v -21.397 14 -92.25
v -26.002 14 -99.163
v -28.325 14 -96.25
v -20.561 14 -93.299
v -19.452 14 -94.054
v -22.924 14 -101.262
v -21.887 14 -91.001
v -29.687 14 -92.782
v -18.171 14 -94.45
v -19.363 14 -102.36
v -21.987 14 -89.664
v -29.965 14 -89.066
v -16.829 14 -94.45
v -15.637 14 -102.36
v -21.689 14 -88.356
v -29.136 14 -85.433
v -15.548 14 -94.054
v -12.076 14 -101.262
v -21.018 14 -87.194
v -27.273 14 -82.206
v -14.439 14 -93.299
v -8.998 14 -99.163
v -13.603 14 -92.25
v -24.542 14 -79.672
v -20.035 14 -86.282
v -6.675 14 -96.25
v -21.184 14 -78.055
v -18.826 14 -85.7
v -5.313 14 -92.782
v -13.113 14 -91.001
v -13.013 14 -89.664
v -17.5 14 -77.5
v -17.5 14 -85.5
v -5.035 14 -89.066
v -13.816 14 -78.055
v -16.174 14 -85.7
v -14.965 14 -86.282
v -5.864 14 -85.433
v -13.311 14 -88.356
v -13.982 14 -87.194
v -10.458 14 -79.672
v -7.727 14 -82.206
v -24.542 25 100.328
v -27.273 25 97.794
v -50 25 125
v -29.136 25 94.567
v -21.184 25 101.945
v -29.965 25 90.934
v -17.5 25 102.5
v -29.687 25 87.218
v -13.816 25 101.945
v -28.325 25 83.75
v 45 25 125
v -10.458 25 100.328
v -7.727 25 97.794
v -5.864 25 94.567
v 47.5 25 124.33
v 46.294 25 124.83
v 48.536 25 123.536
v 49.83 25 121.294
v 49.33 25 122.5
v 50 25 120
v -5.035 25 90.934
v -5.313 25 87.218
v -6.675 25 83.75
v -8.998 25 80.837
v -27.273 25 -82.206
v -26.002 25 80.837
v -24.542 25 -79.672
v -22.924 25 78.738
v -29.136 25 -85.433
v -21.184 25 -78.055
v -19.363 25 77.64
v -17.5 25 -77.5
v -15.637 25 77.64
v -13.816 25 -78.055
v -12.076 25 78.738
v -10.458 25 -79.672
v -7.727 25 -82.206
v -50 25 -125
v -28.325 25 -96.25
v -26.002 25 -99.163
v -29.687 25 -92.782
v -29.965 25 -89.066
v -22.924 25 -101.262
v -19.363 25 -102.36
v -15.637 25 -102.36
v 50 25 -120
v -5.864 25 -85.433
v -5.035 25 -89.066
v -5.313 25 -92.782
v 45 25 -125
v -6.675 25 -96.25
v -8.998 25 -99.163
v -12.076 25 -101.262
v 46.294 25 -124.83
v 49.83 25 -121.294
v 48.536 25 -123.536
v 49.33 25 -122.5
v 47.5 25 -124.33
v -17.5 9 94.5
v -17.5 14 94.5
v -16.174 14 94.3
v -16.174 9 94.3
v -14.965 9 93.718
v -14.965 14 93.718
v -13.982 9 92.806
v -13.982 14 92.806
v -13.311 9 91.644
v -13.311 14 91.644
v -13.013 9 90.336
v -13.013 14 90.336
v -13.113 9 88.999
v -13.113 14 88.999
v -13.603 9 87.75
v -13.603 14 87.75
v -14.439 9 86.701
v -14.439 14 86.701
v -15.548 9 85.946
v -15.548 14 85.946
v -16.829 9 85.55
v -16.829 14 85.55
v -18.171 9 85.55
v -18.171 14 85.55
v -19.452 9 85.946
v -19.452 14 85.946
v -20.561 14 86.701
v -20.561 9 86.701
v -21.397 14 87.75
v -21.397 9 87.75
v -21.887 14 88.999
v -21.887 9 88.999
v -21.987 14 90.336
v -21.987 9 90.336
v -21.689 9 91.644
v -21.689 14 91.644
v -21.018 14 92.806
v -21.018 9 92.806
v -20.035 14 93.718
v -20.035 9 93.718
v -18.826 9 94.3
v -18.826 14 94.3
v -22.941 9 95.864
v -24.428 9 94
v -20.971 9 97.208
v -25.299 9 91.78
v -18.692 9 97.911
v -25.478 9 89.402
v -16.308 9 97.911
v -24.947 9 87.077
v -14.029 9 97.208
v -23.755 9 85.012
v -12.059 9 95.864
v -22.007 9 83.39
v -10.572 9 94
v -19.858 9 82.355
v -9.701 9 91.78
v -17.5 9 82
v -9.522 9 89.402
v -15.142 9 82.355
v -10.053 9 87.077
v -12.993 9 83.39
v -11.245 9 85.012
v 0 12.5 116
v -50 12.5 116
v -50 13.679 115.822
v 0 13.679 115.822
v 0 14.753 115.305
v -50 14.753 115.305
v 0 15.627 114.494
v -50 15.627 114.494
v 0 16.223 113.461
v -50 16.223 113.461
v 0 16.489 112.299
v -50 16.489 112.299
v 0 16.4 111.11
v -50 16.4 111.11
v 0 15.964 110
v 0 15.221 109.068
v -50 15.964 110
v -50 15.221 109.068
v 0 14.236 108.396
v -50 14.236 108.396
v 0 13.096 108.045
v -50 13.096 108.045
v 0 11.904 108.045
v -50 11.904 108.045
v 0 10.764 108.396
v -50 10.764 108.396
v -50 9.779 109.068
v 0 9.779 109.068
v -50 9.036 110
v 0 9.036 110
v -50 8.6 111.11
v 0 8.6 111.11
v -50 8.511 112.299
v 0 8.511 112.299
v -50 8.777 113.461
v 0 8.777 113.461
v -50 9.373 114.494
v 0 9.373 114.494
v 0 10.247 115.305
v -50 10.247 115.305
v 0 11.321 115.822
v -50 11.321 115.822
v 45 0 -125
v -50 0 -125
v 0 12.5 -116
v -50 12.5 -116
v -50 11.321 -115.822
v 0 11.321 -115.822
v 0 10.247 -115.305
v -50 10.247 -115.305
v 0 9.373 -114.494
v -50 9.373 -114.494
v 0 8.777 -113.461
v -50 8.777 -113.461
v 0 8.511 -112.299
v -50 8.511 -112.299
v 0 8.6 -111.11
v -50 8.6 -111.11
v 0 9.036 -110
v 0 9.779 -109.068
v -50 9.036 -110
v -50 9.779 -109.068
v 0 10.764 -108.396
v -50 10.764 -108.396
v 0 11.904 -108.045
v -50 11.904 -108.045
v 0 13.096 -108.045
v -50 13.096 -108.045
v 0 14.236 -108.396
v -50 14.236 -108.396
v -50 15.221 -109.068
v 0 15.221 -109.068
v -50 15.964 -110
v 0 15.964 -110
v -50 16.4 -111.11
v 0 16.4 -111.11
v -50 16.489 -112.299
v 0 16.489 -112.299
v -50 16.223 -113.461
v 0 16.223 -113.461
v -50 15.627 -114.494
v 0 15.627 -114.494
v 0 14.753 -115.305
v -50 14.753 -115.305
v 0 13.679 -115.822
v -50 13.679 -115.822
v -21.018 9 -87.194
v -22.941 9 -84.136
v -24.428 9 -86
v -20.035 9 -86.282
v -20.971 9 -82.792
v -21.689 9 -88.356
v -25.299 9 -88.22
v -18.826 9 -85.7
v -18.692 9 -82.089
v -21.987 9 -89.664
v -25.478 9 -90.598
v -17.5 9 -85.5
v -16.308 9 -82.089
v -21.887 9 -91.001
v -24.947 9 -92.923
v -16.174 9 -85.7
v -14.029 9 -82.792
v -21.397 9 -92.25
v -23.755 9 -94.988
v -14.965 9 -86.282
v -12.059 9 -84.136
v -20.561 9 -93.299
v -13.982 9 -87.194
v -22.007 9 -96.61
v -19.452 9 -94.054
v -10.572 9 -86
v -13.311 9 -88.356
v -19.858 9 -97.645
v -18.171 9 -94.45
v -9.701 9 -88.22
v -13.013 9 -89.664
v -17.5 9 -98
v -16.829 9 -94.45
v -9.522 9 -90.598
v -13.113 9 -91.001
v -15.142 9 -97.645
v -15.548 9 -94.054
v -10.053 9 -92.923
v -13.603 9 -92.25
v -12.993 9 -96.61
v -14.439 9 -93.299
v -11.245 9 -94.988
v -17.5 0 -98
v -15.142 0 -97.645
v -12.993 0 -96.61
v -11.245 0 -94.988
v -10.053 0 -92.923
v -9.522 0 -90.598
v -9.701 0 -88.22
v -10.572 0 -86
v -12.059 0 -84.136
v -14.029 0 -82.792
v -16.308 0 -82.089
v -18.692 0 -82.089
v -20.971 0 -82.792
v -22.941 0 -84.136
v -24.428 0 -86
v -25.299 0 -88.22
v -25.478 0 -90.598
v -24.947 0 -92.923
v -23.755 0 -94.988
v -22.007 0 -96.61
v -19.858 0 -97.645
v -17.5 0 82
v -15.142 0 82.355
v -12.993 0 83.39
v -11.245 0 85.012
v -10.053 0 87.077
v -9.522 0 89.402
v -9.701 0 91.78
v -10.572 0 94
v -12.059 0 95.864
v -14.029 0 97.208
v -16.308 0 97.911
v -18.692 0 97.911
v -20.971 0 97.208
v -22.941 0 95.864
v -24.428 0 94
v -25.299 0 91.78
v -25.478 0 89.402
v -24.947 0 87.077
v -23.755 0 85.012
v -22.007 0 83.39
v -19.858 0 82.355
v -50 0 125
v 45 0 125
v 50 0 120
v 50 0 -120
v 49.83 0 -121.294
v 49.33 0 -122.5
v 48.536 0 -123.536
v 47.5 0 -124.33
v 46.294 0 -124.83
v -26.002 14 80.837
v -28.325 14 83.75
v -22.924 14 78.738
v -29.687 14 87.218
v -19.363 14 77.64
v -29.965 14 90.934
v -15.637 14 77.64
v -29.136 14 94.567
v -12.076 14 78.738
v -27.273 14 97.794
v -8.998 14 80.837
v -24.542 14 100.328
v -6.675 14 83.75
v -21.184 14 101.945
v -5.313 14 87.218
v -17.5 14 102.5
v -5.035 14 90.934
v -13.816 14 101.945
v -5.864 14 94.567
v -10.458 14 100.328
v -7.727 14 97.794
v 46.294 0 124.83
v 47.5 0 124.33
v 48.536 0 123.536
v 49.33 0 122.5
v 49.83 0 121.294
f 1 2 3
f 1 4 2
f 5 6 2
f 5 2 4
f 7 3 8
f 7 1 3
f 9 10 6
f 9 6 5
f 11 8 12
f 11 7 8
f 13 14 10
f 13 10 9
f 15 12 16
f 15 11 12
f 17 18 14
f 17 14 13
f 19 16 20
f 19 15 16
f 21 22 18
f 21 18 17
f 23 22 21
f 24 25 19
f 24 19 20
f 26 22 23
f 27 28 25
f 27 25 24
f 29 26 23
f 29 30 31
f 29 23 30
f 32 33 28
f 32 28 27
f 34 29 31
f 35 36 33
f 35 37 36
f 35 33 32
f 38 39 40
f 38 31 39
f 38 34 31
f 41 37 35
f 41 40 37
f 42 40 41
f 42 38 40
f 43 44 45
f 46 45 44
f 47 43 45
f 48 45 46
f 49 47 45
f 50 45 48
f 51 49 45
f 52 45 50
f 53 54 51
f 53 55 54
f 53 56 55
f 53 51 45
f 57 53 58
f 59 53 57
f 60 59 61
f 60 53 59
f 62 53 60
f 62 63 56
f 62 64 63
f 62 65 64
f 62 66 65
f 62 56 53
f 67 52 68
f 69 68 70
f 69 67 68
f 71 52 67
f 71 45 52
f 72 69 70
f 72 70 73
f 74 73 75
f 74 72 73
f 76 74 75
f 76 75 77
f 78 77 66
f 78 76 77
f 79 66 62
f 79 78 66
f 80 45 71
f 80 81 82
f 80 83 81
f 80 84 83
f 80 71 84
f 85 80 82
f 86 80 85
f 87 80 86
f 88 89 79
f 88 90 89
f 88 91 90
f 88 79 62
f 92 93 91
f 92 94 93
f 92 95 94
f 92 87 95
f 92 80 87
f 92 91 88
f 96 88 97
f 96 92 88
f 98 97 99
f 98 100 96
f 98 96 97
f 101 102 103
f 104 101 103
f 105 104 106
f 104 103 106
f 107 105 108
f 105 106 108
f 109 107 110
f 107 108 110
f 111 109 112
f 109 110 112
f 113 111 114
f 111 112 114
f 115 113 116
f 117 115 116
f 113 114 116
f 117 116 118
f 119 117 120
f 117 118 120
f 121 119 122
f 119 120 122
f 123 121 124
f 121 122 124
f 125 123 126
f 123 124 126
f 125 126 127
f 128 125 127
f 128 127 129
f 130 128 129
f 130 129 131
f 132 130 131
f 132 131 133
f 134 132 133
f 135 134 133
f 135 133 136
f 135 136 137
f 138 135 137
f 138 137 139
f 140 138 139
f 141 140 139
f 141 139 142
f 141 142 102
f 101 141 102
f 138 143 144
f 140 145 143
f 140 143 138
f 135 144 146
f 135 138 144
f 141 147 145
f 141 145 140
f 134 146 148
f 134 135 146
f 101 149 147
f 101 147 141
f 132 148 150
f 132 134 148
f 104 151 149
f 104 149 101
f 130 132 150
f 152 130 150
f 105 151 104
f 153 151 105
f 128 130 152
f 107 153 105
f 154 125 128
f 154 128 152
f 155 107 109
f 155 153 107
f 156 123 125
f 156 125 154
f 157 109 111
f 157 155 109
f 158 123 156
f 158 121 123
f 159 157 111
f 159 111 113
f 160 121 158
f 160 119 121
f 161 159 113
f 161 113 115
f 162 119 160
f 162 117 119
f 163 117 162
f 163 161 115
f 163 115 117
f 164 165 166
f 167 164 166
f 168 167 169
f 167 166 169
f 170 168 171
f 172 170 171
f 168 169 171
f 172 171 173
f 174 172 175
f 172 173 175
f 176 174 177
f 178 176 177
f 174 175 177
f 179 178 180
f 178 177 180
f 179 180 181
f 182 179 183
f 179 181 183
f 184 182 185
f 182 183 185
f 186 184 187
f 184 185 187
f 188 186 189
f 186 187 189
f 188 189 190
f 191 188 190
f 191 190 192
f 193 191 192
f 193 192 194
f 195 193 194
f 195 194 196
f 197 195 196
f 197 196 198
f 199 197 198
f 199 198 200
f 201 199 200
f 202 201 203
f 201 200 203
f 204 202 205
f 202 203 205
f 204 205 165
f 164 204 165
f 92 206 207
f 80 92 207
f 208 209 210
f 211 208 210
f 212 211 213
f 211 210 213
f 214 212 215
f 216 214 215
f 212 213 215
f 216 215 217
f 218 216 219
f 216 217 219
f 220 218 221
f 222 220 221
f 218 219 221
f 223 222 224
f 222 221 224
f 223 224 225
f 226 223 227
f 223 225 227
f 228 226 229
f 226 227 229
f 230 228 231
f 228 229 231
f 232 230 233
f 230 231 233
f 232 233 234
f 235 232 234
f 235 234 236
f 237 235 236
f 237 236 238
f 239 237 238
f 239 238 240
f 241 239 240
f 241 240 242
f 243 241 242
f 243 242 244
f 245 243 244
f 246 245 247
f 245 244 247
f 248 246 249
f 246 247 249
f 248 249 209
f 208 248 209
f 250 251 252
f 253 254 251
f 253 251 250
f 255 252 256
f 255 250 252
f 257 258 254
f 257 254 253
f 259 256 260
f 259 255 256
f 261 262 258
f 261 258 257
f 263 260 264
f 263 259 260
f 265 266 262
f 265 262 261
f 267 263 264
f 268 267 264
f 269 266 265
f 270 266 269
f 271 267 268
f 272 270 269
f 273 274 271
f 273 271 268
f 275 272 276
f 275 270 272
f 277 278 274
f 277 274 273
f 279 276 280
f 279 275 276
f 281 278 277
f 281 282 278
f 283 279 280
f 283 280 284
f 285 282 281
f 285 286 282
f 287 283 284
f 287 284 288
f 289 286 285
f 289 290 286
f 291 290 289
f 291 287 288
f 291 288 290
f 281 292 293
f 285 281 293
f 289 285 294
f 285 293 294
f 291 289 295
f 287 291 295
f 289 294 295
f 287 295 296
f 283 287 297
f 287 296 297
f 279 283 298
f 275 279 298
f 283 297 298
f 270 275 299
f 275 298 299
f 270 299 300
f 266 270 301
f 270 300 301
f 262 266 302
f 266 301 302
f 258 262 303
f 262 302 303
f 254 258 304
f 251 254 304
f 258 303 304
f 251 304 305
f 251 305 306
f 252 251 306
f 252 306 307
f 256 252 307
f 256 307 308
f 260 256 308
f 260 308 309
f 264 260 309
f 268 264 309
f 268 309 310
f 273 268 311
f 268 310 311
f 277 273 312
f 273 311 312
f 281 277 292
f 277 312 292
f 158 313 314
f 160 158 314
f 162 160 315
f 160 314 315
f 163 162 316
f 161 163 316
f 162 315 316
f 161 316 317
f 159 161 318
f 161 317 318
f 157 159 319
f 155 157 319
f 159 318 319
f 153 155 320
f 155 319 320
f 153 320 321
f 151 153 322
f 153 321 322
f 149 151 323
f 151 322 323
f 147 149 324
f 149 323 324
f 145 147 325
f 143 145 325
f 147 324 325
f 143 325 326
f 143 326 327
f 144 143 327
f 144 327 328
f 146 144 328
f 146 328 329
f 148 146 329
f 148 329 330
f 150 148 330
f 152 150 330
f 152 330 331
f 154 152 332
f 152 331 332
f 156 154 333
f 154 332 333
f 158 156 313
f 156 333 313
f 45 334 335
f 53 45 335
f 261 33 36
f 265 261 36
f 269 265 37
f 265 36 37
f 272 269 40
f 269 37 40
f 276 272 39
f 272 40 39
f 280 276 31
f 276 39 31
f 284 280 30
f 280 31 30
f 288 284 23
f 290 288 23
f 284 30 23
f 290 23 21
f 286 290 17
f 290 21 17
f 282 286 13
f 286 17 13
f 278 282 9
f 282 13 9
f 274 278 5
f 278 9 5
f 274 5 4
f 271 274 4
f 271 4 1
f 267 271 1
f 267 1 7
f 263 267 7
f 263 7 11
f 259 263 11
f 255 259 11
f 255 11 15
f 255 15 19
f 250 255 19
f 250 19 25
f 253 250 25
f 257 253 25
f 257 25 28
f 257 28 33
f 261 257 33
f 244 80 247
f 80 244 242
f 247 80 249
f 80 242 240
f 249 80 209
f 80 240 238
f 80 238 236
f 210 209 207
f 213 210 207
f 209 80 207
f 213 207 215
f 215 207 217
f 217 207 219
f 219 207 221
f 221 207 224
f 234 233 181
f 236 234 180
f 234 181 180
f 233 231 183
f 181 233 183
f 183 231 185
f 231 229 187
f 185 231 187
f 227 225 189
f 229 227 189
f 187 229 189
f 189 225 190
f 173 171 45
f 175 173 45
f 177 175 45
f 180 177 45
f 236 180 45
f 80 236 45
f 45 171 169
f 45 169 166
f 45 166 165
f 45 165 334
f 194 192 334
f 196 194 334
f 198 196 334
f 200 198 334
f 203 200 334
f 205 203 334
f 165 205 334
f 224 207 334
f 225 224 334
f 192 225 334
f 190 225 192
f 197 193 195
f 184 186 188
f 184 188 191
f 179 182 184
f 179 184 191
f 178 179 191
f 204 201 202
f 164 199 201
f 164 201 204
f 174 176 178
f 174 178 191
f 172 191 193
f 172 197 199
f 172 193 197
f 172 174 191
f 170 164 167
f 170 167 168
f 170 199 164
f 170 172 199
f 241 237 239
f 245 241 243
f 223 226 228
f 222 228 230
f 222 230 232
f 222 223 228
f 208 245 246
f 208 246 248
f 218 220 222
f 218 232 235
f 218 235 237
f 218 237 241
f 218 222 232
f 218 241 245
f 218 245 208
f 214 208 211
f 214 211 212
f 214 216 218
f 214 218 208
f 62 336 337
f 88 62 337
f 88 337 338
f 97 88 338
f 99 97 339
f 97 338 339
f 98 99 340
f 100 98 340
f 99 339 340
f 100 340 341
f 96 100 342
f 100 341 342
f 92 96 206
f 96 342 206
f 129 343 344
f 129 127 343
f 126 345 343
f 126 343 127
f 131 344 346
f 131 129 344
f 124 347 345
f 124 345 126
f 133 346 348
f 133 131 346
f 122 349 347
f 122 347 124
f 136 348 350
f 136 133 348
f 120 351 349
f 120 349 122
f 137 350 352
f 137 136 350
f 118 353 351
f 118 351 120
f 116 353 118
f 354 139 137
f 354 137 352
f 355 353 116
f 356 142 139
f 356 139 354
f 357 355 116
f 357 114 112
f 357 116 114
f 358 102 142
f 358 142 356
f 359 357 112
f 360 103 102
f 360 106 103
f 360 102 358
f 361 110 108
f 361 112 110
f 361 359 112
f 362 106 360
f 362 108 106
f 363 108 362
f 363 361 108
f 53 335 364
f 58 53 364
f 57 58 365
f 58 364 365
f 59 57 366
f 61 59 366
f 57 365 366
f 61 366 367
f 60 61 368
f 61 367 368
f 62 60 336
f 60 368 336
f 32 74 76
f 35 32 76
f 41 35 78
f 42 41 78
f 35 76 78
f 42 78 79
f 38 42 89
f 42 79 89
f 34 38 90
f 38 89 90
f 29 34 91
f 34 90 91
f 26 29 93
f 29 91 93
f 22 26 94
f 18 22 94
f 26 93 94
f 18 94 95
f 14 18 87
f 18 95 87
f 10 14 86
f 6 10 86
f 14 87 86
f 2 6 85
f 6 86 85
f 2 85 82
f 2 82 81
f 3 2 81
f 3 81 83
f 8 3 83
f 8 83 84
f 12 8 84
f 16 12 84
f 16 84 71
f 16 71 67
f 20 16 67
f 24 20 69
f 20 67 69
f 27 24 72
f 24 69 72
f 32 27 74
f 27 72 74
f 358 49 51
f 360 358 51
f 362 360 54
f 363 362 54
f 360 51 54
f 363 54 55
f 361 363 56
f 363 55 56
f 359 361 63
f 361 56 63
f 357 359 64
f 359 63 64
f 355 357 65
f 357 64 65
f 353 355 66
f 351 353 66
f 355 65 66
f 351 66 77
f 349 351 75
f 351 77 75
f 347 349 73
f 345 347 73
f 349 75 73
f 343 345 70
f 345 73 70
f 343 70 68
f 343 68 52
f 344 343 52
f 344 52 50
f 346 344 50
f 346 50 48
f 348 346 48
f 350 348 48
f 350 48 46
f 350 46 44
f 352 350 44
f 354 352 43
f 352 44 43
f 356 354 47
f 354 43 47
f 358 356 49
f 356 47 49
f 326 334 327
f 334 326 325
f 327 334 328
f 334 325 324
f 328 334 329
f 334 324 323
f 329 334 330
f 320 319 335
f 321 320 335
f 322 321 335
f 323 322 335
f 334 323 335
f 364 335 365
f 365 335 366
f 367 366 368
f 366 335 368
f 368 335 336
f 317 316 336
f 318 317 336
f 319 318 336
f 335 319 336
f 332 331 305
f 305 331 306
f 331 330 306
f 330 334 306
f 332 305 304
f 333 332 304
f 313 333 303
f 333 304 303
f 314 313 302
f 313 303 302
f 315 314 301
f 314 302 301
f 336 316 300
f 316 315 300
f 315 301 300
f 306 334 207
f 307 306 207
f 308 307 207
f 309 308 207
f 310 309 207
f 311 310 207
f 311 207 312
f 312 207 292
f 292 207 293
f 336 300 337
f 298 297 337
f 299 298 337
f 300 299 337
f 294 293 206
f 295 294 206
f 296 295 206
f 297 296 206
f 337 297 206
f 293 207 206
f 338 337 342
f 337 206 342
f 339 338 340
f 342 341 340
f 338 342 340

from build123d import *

# Parameters (mm, degrees)
EXTRUDE_1_DEPTH     = 25
SKETCH_2_R          = 12.5
CUT_EXTRUDE_1_DEPTH = 11
SKETCH_3_R          = 4.5
CUT_EXTRUDE_2_DEPTH = 15
SKETCH_5_R          = 8
CUT_EXTRUDE_3_DEPTH = 9
SKETCH_6_R          = 4
CUT_EXTRUDE_4_DEPTH = 50


with BuildPart() as part:
    # 草图1 → 凸台-拉伸1 (new body)
    with BuildSketch(Plane(origin=(0, 0, 0), x_dir=(1, 0, 0), z_dir=(0, 1, 0))):
        with BuildLine():
            Line((-50, -125), (45, -125))
            ThreePointArc((45, -125), (48.535533906, -123.535533906), (50, -120))
            Line((50, -120), (50, 120))
            ThreePointArc((50, 120), (48.535533906, 123.535533906), (45, 125))
            Line((45, 125), (-50, 125))
            Line((-50, 125), (-50, -125))
        make_face()
    extrude(amount=EXTRUDE_1_DEPTH)

    # 草图2 → 切除-拉伸1 (cut)
    with BuildSketch(Plane(origin=(0, 25, 0), x_dir=(1, 0, 0), z_dir=(0, 1, 0))):
        with Locations(Location((-17.5, 90, 0), (0, 0, 270))):
            Circle(SKETCH_2_R)
        with Locations(Location((-17.5, -90, 0), (0, 0, 270))):
            Circle(SKETCH_2_R)
    extrude(amount=-CUT_EXTRUDE_1_DEPTH, mode=Mode.SUBTRACT)

    # 草图3 → 切除-拉伸2 (cut)
    with BuildSketch(Plane(origin=(0, 14, 0), x_dir=(1, 0, 0), z_dir=(0, 1, 0))):
        with Locations(Location((-17.5, 90, 0), (0, 0, 270))):
            Circle(SKETCH_3_R)
        with Locations(Location((-17.5, -90, 0), (0, 0, 270))):
            Circle(SKETCH_3_R)
    extrude(amount=-CUT_EXTRUDE_2_DEPTH, mode=Mode.SUBTRACT)

    # 草图5 → 切除-拉伸3 (cut)
    with BuildSketch(Plane.XZ):
        with Locations(Location((-17.5, 90, 0), (0, 0, 270))):
            Circle(SKETCH_5_R)
        with Locations(Location((-17.5, -90, 0), (0, 0, 270))):
            Circle(SKETCH_5_R)
    extrude(amount=-CUT_EXTRUDE_3_DEPTH, mode=Mode.SUBTRACT)

    # 草图6 → 切除-拉伸4 (cut)
    with BuildSketch(Plane.ZY.offset(50)):
        with Locations((112, 12.5)):
            Circle(SKETCH_6_R)
        with Locations(Location((-112, 12.5, 0), (0, 0, 180))):
            Circle(SKETCH_6_R)
    extrude(amount=-CUT_EXTRUDE_4_DEPTH, mode=Mode.SUBTRACT)


solid = part.part
